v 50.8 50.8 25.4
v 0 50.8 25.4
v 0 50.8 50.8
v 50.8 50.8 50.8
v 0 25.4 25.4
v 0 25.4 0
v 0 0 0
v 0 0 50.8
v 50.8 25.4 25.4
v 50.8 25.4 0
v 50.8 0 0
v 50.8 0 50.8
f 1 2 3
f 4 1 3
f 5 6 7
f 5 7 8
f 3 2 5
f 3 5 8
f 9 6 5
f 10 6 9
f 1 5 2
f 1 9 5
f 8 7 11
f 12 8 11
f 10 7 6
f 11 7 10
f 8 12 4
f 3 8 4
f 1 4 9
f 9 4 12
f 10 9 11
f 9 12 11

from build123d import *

# Parameters (mm, degrees)
SKETCH1_W           = 50.8
SKETCH1_H           = 50.8
BOSS_EXTRUDE1_DEPTH = 25.4
SKETCH2_W           = 25.4
SKETCH2_H           = 25.4
BOSS_EXTRUDE2_DEPTH = 25.4
SKETCH3_W           = 25.4
SKETCH3_H           = 25.4
BOSS_EXTRUDE3_DEPTH = 25.4


with BuildPart() as part:
    # Sketch1 → Boss-Extrude1 (new body)
    with BuildSketch(Plane(origin=(0, 0, 0), x_dir=(1, 0, 0), z_dir=(0, 1, 0))):
        with Locations((25.4, -25.4)):
            Rectangle(SKETCH1_W, SKETCH1_H)
    extrude(amount=BOSS_EXTRUDE1_DEPTH)

    # Sketch2 → Boss-Extrude2 (add)
    with BuildSketch(Plane(origin=(0, 25.4, 0), x_dir=(1, 0, 0), z_dir=(0, 1, 0))):
        with Locations((38.1, -38.1)):
            Rectangle(SKETCH2_W, SKETCH2_H)
    extrude(amount=BOSS_EXTRUDE2_DEPTH)

    # Sketch3 → Boss-Extrude3 (add)
    with BuildSketch(Plane.ZY.offset(-25.4)):
        with Locations((38.1, 38.1)):
            Rectangle(SKETCH3_W, SKETCH3_H)
    extrude(amount=BOSS_EXTRUDE3_DEPTH)


solid = part.part
